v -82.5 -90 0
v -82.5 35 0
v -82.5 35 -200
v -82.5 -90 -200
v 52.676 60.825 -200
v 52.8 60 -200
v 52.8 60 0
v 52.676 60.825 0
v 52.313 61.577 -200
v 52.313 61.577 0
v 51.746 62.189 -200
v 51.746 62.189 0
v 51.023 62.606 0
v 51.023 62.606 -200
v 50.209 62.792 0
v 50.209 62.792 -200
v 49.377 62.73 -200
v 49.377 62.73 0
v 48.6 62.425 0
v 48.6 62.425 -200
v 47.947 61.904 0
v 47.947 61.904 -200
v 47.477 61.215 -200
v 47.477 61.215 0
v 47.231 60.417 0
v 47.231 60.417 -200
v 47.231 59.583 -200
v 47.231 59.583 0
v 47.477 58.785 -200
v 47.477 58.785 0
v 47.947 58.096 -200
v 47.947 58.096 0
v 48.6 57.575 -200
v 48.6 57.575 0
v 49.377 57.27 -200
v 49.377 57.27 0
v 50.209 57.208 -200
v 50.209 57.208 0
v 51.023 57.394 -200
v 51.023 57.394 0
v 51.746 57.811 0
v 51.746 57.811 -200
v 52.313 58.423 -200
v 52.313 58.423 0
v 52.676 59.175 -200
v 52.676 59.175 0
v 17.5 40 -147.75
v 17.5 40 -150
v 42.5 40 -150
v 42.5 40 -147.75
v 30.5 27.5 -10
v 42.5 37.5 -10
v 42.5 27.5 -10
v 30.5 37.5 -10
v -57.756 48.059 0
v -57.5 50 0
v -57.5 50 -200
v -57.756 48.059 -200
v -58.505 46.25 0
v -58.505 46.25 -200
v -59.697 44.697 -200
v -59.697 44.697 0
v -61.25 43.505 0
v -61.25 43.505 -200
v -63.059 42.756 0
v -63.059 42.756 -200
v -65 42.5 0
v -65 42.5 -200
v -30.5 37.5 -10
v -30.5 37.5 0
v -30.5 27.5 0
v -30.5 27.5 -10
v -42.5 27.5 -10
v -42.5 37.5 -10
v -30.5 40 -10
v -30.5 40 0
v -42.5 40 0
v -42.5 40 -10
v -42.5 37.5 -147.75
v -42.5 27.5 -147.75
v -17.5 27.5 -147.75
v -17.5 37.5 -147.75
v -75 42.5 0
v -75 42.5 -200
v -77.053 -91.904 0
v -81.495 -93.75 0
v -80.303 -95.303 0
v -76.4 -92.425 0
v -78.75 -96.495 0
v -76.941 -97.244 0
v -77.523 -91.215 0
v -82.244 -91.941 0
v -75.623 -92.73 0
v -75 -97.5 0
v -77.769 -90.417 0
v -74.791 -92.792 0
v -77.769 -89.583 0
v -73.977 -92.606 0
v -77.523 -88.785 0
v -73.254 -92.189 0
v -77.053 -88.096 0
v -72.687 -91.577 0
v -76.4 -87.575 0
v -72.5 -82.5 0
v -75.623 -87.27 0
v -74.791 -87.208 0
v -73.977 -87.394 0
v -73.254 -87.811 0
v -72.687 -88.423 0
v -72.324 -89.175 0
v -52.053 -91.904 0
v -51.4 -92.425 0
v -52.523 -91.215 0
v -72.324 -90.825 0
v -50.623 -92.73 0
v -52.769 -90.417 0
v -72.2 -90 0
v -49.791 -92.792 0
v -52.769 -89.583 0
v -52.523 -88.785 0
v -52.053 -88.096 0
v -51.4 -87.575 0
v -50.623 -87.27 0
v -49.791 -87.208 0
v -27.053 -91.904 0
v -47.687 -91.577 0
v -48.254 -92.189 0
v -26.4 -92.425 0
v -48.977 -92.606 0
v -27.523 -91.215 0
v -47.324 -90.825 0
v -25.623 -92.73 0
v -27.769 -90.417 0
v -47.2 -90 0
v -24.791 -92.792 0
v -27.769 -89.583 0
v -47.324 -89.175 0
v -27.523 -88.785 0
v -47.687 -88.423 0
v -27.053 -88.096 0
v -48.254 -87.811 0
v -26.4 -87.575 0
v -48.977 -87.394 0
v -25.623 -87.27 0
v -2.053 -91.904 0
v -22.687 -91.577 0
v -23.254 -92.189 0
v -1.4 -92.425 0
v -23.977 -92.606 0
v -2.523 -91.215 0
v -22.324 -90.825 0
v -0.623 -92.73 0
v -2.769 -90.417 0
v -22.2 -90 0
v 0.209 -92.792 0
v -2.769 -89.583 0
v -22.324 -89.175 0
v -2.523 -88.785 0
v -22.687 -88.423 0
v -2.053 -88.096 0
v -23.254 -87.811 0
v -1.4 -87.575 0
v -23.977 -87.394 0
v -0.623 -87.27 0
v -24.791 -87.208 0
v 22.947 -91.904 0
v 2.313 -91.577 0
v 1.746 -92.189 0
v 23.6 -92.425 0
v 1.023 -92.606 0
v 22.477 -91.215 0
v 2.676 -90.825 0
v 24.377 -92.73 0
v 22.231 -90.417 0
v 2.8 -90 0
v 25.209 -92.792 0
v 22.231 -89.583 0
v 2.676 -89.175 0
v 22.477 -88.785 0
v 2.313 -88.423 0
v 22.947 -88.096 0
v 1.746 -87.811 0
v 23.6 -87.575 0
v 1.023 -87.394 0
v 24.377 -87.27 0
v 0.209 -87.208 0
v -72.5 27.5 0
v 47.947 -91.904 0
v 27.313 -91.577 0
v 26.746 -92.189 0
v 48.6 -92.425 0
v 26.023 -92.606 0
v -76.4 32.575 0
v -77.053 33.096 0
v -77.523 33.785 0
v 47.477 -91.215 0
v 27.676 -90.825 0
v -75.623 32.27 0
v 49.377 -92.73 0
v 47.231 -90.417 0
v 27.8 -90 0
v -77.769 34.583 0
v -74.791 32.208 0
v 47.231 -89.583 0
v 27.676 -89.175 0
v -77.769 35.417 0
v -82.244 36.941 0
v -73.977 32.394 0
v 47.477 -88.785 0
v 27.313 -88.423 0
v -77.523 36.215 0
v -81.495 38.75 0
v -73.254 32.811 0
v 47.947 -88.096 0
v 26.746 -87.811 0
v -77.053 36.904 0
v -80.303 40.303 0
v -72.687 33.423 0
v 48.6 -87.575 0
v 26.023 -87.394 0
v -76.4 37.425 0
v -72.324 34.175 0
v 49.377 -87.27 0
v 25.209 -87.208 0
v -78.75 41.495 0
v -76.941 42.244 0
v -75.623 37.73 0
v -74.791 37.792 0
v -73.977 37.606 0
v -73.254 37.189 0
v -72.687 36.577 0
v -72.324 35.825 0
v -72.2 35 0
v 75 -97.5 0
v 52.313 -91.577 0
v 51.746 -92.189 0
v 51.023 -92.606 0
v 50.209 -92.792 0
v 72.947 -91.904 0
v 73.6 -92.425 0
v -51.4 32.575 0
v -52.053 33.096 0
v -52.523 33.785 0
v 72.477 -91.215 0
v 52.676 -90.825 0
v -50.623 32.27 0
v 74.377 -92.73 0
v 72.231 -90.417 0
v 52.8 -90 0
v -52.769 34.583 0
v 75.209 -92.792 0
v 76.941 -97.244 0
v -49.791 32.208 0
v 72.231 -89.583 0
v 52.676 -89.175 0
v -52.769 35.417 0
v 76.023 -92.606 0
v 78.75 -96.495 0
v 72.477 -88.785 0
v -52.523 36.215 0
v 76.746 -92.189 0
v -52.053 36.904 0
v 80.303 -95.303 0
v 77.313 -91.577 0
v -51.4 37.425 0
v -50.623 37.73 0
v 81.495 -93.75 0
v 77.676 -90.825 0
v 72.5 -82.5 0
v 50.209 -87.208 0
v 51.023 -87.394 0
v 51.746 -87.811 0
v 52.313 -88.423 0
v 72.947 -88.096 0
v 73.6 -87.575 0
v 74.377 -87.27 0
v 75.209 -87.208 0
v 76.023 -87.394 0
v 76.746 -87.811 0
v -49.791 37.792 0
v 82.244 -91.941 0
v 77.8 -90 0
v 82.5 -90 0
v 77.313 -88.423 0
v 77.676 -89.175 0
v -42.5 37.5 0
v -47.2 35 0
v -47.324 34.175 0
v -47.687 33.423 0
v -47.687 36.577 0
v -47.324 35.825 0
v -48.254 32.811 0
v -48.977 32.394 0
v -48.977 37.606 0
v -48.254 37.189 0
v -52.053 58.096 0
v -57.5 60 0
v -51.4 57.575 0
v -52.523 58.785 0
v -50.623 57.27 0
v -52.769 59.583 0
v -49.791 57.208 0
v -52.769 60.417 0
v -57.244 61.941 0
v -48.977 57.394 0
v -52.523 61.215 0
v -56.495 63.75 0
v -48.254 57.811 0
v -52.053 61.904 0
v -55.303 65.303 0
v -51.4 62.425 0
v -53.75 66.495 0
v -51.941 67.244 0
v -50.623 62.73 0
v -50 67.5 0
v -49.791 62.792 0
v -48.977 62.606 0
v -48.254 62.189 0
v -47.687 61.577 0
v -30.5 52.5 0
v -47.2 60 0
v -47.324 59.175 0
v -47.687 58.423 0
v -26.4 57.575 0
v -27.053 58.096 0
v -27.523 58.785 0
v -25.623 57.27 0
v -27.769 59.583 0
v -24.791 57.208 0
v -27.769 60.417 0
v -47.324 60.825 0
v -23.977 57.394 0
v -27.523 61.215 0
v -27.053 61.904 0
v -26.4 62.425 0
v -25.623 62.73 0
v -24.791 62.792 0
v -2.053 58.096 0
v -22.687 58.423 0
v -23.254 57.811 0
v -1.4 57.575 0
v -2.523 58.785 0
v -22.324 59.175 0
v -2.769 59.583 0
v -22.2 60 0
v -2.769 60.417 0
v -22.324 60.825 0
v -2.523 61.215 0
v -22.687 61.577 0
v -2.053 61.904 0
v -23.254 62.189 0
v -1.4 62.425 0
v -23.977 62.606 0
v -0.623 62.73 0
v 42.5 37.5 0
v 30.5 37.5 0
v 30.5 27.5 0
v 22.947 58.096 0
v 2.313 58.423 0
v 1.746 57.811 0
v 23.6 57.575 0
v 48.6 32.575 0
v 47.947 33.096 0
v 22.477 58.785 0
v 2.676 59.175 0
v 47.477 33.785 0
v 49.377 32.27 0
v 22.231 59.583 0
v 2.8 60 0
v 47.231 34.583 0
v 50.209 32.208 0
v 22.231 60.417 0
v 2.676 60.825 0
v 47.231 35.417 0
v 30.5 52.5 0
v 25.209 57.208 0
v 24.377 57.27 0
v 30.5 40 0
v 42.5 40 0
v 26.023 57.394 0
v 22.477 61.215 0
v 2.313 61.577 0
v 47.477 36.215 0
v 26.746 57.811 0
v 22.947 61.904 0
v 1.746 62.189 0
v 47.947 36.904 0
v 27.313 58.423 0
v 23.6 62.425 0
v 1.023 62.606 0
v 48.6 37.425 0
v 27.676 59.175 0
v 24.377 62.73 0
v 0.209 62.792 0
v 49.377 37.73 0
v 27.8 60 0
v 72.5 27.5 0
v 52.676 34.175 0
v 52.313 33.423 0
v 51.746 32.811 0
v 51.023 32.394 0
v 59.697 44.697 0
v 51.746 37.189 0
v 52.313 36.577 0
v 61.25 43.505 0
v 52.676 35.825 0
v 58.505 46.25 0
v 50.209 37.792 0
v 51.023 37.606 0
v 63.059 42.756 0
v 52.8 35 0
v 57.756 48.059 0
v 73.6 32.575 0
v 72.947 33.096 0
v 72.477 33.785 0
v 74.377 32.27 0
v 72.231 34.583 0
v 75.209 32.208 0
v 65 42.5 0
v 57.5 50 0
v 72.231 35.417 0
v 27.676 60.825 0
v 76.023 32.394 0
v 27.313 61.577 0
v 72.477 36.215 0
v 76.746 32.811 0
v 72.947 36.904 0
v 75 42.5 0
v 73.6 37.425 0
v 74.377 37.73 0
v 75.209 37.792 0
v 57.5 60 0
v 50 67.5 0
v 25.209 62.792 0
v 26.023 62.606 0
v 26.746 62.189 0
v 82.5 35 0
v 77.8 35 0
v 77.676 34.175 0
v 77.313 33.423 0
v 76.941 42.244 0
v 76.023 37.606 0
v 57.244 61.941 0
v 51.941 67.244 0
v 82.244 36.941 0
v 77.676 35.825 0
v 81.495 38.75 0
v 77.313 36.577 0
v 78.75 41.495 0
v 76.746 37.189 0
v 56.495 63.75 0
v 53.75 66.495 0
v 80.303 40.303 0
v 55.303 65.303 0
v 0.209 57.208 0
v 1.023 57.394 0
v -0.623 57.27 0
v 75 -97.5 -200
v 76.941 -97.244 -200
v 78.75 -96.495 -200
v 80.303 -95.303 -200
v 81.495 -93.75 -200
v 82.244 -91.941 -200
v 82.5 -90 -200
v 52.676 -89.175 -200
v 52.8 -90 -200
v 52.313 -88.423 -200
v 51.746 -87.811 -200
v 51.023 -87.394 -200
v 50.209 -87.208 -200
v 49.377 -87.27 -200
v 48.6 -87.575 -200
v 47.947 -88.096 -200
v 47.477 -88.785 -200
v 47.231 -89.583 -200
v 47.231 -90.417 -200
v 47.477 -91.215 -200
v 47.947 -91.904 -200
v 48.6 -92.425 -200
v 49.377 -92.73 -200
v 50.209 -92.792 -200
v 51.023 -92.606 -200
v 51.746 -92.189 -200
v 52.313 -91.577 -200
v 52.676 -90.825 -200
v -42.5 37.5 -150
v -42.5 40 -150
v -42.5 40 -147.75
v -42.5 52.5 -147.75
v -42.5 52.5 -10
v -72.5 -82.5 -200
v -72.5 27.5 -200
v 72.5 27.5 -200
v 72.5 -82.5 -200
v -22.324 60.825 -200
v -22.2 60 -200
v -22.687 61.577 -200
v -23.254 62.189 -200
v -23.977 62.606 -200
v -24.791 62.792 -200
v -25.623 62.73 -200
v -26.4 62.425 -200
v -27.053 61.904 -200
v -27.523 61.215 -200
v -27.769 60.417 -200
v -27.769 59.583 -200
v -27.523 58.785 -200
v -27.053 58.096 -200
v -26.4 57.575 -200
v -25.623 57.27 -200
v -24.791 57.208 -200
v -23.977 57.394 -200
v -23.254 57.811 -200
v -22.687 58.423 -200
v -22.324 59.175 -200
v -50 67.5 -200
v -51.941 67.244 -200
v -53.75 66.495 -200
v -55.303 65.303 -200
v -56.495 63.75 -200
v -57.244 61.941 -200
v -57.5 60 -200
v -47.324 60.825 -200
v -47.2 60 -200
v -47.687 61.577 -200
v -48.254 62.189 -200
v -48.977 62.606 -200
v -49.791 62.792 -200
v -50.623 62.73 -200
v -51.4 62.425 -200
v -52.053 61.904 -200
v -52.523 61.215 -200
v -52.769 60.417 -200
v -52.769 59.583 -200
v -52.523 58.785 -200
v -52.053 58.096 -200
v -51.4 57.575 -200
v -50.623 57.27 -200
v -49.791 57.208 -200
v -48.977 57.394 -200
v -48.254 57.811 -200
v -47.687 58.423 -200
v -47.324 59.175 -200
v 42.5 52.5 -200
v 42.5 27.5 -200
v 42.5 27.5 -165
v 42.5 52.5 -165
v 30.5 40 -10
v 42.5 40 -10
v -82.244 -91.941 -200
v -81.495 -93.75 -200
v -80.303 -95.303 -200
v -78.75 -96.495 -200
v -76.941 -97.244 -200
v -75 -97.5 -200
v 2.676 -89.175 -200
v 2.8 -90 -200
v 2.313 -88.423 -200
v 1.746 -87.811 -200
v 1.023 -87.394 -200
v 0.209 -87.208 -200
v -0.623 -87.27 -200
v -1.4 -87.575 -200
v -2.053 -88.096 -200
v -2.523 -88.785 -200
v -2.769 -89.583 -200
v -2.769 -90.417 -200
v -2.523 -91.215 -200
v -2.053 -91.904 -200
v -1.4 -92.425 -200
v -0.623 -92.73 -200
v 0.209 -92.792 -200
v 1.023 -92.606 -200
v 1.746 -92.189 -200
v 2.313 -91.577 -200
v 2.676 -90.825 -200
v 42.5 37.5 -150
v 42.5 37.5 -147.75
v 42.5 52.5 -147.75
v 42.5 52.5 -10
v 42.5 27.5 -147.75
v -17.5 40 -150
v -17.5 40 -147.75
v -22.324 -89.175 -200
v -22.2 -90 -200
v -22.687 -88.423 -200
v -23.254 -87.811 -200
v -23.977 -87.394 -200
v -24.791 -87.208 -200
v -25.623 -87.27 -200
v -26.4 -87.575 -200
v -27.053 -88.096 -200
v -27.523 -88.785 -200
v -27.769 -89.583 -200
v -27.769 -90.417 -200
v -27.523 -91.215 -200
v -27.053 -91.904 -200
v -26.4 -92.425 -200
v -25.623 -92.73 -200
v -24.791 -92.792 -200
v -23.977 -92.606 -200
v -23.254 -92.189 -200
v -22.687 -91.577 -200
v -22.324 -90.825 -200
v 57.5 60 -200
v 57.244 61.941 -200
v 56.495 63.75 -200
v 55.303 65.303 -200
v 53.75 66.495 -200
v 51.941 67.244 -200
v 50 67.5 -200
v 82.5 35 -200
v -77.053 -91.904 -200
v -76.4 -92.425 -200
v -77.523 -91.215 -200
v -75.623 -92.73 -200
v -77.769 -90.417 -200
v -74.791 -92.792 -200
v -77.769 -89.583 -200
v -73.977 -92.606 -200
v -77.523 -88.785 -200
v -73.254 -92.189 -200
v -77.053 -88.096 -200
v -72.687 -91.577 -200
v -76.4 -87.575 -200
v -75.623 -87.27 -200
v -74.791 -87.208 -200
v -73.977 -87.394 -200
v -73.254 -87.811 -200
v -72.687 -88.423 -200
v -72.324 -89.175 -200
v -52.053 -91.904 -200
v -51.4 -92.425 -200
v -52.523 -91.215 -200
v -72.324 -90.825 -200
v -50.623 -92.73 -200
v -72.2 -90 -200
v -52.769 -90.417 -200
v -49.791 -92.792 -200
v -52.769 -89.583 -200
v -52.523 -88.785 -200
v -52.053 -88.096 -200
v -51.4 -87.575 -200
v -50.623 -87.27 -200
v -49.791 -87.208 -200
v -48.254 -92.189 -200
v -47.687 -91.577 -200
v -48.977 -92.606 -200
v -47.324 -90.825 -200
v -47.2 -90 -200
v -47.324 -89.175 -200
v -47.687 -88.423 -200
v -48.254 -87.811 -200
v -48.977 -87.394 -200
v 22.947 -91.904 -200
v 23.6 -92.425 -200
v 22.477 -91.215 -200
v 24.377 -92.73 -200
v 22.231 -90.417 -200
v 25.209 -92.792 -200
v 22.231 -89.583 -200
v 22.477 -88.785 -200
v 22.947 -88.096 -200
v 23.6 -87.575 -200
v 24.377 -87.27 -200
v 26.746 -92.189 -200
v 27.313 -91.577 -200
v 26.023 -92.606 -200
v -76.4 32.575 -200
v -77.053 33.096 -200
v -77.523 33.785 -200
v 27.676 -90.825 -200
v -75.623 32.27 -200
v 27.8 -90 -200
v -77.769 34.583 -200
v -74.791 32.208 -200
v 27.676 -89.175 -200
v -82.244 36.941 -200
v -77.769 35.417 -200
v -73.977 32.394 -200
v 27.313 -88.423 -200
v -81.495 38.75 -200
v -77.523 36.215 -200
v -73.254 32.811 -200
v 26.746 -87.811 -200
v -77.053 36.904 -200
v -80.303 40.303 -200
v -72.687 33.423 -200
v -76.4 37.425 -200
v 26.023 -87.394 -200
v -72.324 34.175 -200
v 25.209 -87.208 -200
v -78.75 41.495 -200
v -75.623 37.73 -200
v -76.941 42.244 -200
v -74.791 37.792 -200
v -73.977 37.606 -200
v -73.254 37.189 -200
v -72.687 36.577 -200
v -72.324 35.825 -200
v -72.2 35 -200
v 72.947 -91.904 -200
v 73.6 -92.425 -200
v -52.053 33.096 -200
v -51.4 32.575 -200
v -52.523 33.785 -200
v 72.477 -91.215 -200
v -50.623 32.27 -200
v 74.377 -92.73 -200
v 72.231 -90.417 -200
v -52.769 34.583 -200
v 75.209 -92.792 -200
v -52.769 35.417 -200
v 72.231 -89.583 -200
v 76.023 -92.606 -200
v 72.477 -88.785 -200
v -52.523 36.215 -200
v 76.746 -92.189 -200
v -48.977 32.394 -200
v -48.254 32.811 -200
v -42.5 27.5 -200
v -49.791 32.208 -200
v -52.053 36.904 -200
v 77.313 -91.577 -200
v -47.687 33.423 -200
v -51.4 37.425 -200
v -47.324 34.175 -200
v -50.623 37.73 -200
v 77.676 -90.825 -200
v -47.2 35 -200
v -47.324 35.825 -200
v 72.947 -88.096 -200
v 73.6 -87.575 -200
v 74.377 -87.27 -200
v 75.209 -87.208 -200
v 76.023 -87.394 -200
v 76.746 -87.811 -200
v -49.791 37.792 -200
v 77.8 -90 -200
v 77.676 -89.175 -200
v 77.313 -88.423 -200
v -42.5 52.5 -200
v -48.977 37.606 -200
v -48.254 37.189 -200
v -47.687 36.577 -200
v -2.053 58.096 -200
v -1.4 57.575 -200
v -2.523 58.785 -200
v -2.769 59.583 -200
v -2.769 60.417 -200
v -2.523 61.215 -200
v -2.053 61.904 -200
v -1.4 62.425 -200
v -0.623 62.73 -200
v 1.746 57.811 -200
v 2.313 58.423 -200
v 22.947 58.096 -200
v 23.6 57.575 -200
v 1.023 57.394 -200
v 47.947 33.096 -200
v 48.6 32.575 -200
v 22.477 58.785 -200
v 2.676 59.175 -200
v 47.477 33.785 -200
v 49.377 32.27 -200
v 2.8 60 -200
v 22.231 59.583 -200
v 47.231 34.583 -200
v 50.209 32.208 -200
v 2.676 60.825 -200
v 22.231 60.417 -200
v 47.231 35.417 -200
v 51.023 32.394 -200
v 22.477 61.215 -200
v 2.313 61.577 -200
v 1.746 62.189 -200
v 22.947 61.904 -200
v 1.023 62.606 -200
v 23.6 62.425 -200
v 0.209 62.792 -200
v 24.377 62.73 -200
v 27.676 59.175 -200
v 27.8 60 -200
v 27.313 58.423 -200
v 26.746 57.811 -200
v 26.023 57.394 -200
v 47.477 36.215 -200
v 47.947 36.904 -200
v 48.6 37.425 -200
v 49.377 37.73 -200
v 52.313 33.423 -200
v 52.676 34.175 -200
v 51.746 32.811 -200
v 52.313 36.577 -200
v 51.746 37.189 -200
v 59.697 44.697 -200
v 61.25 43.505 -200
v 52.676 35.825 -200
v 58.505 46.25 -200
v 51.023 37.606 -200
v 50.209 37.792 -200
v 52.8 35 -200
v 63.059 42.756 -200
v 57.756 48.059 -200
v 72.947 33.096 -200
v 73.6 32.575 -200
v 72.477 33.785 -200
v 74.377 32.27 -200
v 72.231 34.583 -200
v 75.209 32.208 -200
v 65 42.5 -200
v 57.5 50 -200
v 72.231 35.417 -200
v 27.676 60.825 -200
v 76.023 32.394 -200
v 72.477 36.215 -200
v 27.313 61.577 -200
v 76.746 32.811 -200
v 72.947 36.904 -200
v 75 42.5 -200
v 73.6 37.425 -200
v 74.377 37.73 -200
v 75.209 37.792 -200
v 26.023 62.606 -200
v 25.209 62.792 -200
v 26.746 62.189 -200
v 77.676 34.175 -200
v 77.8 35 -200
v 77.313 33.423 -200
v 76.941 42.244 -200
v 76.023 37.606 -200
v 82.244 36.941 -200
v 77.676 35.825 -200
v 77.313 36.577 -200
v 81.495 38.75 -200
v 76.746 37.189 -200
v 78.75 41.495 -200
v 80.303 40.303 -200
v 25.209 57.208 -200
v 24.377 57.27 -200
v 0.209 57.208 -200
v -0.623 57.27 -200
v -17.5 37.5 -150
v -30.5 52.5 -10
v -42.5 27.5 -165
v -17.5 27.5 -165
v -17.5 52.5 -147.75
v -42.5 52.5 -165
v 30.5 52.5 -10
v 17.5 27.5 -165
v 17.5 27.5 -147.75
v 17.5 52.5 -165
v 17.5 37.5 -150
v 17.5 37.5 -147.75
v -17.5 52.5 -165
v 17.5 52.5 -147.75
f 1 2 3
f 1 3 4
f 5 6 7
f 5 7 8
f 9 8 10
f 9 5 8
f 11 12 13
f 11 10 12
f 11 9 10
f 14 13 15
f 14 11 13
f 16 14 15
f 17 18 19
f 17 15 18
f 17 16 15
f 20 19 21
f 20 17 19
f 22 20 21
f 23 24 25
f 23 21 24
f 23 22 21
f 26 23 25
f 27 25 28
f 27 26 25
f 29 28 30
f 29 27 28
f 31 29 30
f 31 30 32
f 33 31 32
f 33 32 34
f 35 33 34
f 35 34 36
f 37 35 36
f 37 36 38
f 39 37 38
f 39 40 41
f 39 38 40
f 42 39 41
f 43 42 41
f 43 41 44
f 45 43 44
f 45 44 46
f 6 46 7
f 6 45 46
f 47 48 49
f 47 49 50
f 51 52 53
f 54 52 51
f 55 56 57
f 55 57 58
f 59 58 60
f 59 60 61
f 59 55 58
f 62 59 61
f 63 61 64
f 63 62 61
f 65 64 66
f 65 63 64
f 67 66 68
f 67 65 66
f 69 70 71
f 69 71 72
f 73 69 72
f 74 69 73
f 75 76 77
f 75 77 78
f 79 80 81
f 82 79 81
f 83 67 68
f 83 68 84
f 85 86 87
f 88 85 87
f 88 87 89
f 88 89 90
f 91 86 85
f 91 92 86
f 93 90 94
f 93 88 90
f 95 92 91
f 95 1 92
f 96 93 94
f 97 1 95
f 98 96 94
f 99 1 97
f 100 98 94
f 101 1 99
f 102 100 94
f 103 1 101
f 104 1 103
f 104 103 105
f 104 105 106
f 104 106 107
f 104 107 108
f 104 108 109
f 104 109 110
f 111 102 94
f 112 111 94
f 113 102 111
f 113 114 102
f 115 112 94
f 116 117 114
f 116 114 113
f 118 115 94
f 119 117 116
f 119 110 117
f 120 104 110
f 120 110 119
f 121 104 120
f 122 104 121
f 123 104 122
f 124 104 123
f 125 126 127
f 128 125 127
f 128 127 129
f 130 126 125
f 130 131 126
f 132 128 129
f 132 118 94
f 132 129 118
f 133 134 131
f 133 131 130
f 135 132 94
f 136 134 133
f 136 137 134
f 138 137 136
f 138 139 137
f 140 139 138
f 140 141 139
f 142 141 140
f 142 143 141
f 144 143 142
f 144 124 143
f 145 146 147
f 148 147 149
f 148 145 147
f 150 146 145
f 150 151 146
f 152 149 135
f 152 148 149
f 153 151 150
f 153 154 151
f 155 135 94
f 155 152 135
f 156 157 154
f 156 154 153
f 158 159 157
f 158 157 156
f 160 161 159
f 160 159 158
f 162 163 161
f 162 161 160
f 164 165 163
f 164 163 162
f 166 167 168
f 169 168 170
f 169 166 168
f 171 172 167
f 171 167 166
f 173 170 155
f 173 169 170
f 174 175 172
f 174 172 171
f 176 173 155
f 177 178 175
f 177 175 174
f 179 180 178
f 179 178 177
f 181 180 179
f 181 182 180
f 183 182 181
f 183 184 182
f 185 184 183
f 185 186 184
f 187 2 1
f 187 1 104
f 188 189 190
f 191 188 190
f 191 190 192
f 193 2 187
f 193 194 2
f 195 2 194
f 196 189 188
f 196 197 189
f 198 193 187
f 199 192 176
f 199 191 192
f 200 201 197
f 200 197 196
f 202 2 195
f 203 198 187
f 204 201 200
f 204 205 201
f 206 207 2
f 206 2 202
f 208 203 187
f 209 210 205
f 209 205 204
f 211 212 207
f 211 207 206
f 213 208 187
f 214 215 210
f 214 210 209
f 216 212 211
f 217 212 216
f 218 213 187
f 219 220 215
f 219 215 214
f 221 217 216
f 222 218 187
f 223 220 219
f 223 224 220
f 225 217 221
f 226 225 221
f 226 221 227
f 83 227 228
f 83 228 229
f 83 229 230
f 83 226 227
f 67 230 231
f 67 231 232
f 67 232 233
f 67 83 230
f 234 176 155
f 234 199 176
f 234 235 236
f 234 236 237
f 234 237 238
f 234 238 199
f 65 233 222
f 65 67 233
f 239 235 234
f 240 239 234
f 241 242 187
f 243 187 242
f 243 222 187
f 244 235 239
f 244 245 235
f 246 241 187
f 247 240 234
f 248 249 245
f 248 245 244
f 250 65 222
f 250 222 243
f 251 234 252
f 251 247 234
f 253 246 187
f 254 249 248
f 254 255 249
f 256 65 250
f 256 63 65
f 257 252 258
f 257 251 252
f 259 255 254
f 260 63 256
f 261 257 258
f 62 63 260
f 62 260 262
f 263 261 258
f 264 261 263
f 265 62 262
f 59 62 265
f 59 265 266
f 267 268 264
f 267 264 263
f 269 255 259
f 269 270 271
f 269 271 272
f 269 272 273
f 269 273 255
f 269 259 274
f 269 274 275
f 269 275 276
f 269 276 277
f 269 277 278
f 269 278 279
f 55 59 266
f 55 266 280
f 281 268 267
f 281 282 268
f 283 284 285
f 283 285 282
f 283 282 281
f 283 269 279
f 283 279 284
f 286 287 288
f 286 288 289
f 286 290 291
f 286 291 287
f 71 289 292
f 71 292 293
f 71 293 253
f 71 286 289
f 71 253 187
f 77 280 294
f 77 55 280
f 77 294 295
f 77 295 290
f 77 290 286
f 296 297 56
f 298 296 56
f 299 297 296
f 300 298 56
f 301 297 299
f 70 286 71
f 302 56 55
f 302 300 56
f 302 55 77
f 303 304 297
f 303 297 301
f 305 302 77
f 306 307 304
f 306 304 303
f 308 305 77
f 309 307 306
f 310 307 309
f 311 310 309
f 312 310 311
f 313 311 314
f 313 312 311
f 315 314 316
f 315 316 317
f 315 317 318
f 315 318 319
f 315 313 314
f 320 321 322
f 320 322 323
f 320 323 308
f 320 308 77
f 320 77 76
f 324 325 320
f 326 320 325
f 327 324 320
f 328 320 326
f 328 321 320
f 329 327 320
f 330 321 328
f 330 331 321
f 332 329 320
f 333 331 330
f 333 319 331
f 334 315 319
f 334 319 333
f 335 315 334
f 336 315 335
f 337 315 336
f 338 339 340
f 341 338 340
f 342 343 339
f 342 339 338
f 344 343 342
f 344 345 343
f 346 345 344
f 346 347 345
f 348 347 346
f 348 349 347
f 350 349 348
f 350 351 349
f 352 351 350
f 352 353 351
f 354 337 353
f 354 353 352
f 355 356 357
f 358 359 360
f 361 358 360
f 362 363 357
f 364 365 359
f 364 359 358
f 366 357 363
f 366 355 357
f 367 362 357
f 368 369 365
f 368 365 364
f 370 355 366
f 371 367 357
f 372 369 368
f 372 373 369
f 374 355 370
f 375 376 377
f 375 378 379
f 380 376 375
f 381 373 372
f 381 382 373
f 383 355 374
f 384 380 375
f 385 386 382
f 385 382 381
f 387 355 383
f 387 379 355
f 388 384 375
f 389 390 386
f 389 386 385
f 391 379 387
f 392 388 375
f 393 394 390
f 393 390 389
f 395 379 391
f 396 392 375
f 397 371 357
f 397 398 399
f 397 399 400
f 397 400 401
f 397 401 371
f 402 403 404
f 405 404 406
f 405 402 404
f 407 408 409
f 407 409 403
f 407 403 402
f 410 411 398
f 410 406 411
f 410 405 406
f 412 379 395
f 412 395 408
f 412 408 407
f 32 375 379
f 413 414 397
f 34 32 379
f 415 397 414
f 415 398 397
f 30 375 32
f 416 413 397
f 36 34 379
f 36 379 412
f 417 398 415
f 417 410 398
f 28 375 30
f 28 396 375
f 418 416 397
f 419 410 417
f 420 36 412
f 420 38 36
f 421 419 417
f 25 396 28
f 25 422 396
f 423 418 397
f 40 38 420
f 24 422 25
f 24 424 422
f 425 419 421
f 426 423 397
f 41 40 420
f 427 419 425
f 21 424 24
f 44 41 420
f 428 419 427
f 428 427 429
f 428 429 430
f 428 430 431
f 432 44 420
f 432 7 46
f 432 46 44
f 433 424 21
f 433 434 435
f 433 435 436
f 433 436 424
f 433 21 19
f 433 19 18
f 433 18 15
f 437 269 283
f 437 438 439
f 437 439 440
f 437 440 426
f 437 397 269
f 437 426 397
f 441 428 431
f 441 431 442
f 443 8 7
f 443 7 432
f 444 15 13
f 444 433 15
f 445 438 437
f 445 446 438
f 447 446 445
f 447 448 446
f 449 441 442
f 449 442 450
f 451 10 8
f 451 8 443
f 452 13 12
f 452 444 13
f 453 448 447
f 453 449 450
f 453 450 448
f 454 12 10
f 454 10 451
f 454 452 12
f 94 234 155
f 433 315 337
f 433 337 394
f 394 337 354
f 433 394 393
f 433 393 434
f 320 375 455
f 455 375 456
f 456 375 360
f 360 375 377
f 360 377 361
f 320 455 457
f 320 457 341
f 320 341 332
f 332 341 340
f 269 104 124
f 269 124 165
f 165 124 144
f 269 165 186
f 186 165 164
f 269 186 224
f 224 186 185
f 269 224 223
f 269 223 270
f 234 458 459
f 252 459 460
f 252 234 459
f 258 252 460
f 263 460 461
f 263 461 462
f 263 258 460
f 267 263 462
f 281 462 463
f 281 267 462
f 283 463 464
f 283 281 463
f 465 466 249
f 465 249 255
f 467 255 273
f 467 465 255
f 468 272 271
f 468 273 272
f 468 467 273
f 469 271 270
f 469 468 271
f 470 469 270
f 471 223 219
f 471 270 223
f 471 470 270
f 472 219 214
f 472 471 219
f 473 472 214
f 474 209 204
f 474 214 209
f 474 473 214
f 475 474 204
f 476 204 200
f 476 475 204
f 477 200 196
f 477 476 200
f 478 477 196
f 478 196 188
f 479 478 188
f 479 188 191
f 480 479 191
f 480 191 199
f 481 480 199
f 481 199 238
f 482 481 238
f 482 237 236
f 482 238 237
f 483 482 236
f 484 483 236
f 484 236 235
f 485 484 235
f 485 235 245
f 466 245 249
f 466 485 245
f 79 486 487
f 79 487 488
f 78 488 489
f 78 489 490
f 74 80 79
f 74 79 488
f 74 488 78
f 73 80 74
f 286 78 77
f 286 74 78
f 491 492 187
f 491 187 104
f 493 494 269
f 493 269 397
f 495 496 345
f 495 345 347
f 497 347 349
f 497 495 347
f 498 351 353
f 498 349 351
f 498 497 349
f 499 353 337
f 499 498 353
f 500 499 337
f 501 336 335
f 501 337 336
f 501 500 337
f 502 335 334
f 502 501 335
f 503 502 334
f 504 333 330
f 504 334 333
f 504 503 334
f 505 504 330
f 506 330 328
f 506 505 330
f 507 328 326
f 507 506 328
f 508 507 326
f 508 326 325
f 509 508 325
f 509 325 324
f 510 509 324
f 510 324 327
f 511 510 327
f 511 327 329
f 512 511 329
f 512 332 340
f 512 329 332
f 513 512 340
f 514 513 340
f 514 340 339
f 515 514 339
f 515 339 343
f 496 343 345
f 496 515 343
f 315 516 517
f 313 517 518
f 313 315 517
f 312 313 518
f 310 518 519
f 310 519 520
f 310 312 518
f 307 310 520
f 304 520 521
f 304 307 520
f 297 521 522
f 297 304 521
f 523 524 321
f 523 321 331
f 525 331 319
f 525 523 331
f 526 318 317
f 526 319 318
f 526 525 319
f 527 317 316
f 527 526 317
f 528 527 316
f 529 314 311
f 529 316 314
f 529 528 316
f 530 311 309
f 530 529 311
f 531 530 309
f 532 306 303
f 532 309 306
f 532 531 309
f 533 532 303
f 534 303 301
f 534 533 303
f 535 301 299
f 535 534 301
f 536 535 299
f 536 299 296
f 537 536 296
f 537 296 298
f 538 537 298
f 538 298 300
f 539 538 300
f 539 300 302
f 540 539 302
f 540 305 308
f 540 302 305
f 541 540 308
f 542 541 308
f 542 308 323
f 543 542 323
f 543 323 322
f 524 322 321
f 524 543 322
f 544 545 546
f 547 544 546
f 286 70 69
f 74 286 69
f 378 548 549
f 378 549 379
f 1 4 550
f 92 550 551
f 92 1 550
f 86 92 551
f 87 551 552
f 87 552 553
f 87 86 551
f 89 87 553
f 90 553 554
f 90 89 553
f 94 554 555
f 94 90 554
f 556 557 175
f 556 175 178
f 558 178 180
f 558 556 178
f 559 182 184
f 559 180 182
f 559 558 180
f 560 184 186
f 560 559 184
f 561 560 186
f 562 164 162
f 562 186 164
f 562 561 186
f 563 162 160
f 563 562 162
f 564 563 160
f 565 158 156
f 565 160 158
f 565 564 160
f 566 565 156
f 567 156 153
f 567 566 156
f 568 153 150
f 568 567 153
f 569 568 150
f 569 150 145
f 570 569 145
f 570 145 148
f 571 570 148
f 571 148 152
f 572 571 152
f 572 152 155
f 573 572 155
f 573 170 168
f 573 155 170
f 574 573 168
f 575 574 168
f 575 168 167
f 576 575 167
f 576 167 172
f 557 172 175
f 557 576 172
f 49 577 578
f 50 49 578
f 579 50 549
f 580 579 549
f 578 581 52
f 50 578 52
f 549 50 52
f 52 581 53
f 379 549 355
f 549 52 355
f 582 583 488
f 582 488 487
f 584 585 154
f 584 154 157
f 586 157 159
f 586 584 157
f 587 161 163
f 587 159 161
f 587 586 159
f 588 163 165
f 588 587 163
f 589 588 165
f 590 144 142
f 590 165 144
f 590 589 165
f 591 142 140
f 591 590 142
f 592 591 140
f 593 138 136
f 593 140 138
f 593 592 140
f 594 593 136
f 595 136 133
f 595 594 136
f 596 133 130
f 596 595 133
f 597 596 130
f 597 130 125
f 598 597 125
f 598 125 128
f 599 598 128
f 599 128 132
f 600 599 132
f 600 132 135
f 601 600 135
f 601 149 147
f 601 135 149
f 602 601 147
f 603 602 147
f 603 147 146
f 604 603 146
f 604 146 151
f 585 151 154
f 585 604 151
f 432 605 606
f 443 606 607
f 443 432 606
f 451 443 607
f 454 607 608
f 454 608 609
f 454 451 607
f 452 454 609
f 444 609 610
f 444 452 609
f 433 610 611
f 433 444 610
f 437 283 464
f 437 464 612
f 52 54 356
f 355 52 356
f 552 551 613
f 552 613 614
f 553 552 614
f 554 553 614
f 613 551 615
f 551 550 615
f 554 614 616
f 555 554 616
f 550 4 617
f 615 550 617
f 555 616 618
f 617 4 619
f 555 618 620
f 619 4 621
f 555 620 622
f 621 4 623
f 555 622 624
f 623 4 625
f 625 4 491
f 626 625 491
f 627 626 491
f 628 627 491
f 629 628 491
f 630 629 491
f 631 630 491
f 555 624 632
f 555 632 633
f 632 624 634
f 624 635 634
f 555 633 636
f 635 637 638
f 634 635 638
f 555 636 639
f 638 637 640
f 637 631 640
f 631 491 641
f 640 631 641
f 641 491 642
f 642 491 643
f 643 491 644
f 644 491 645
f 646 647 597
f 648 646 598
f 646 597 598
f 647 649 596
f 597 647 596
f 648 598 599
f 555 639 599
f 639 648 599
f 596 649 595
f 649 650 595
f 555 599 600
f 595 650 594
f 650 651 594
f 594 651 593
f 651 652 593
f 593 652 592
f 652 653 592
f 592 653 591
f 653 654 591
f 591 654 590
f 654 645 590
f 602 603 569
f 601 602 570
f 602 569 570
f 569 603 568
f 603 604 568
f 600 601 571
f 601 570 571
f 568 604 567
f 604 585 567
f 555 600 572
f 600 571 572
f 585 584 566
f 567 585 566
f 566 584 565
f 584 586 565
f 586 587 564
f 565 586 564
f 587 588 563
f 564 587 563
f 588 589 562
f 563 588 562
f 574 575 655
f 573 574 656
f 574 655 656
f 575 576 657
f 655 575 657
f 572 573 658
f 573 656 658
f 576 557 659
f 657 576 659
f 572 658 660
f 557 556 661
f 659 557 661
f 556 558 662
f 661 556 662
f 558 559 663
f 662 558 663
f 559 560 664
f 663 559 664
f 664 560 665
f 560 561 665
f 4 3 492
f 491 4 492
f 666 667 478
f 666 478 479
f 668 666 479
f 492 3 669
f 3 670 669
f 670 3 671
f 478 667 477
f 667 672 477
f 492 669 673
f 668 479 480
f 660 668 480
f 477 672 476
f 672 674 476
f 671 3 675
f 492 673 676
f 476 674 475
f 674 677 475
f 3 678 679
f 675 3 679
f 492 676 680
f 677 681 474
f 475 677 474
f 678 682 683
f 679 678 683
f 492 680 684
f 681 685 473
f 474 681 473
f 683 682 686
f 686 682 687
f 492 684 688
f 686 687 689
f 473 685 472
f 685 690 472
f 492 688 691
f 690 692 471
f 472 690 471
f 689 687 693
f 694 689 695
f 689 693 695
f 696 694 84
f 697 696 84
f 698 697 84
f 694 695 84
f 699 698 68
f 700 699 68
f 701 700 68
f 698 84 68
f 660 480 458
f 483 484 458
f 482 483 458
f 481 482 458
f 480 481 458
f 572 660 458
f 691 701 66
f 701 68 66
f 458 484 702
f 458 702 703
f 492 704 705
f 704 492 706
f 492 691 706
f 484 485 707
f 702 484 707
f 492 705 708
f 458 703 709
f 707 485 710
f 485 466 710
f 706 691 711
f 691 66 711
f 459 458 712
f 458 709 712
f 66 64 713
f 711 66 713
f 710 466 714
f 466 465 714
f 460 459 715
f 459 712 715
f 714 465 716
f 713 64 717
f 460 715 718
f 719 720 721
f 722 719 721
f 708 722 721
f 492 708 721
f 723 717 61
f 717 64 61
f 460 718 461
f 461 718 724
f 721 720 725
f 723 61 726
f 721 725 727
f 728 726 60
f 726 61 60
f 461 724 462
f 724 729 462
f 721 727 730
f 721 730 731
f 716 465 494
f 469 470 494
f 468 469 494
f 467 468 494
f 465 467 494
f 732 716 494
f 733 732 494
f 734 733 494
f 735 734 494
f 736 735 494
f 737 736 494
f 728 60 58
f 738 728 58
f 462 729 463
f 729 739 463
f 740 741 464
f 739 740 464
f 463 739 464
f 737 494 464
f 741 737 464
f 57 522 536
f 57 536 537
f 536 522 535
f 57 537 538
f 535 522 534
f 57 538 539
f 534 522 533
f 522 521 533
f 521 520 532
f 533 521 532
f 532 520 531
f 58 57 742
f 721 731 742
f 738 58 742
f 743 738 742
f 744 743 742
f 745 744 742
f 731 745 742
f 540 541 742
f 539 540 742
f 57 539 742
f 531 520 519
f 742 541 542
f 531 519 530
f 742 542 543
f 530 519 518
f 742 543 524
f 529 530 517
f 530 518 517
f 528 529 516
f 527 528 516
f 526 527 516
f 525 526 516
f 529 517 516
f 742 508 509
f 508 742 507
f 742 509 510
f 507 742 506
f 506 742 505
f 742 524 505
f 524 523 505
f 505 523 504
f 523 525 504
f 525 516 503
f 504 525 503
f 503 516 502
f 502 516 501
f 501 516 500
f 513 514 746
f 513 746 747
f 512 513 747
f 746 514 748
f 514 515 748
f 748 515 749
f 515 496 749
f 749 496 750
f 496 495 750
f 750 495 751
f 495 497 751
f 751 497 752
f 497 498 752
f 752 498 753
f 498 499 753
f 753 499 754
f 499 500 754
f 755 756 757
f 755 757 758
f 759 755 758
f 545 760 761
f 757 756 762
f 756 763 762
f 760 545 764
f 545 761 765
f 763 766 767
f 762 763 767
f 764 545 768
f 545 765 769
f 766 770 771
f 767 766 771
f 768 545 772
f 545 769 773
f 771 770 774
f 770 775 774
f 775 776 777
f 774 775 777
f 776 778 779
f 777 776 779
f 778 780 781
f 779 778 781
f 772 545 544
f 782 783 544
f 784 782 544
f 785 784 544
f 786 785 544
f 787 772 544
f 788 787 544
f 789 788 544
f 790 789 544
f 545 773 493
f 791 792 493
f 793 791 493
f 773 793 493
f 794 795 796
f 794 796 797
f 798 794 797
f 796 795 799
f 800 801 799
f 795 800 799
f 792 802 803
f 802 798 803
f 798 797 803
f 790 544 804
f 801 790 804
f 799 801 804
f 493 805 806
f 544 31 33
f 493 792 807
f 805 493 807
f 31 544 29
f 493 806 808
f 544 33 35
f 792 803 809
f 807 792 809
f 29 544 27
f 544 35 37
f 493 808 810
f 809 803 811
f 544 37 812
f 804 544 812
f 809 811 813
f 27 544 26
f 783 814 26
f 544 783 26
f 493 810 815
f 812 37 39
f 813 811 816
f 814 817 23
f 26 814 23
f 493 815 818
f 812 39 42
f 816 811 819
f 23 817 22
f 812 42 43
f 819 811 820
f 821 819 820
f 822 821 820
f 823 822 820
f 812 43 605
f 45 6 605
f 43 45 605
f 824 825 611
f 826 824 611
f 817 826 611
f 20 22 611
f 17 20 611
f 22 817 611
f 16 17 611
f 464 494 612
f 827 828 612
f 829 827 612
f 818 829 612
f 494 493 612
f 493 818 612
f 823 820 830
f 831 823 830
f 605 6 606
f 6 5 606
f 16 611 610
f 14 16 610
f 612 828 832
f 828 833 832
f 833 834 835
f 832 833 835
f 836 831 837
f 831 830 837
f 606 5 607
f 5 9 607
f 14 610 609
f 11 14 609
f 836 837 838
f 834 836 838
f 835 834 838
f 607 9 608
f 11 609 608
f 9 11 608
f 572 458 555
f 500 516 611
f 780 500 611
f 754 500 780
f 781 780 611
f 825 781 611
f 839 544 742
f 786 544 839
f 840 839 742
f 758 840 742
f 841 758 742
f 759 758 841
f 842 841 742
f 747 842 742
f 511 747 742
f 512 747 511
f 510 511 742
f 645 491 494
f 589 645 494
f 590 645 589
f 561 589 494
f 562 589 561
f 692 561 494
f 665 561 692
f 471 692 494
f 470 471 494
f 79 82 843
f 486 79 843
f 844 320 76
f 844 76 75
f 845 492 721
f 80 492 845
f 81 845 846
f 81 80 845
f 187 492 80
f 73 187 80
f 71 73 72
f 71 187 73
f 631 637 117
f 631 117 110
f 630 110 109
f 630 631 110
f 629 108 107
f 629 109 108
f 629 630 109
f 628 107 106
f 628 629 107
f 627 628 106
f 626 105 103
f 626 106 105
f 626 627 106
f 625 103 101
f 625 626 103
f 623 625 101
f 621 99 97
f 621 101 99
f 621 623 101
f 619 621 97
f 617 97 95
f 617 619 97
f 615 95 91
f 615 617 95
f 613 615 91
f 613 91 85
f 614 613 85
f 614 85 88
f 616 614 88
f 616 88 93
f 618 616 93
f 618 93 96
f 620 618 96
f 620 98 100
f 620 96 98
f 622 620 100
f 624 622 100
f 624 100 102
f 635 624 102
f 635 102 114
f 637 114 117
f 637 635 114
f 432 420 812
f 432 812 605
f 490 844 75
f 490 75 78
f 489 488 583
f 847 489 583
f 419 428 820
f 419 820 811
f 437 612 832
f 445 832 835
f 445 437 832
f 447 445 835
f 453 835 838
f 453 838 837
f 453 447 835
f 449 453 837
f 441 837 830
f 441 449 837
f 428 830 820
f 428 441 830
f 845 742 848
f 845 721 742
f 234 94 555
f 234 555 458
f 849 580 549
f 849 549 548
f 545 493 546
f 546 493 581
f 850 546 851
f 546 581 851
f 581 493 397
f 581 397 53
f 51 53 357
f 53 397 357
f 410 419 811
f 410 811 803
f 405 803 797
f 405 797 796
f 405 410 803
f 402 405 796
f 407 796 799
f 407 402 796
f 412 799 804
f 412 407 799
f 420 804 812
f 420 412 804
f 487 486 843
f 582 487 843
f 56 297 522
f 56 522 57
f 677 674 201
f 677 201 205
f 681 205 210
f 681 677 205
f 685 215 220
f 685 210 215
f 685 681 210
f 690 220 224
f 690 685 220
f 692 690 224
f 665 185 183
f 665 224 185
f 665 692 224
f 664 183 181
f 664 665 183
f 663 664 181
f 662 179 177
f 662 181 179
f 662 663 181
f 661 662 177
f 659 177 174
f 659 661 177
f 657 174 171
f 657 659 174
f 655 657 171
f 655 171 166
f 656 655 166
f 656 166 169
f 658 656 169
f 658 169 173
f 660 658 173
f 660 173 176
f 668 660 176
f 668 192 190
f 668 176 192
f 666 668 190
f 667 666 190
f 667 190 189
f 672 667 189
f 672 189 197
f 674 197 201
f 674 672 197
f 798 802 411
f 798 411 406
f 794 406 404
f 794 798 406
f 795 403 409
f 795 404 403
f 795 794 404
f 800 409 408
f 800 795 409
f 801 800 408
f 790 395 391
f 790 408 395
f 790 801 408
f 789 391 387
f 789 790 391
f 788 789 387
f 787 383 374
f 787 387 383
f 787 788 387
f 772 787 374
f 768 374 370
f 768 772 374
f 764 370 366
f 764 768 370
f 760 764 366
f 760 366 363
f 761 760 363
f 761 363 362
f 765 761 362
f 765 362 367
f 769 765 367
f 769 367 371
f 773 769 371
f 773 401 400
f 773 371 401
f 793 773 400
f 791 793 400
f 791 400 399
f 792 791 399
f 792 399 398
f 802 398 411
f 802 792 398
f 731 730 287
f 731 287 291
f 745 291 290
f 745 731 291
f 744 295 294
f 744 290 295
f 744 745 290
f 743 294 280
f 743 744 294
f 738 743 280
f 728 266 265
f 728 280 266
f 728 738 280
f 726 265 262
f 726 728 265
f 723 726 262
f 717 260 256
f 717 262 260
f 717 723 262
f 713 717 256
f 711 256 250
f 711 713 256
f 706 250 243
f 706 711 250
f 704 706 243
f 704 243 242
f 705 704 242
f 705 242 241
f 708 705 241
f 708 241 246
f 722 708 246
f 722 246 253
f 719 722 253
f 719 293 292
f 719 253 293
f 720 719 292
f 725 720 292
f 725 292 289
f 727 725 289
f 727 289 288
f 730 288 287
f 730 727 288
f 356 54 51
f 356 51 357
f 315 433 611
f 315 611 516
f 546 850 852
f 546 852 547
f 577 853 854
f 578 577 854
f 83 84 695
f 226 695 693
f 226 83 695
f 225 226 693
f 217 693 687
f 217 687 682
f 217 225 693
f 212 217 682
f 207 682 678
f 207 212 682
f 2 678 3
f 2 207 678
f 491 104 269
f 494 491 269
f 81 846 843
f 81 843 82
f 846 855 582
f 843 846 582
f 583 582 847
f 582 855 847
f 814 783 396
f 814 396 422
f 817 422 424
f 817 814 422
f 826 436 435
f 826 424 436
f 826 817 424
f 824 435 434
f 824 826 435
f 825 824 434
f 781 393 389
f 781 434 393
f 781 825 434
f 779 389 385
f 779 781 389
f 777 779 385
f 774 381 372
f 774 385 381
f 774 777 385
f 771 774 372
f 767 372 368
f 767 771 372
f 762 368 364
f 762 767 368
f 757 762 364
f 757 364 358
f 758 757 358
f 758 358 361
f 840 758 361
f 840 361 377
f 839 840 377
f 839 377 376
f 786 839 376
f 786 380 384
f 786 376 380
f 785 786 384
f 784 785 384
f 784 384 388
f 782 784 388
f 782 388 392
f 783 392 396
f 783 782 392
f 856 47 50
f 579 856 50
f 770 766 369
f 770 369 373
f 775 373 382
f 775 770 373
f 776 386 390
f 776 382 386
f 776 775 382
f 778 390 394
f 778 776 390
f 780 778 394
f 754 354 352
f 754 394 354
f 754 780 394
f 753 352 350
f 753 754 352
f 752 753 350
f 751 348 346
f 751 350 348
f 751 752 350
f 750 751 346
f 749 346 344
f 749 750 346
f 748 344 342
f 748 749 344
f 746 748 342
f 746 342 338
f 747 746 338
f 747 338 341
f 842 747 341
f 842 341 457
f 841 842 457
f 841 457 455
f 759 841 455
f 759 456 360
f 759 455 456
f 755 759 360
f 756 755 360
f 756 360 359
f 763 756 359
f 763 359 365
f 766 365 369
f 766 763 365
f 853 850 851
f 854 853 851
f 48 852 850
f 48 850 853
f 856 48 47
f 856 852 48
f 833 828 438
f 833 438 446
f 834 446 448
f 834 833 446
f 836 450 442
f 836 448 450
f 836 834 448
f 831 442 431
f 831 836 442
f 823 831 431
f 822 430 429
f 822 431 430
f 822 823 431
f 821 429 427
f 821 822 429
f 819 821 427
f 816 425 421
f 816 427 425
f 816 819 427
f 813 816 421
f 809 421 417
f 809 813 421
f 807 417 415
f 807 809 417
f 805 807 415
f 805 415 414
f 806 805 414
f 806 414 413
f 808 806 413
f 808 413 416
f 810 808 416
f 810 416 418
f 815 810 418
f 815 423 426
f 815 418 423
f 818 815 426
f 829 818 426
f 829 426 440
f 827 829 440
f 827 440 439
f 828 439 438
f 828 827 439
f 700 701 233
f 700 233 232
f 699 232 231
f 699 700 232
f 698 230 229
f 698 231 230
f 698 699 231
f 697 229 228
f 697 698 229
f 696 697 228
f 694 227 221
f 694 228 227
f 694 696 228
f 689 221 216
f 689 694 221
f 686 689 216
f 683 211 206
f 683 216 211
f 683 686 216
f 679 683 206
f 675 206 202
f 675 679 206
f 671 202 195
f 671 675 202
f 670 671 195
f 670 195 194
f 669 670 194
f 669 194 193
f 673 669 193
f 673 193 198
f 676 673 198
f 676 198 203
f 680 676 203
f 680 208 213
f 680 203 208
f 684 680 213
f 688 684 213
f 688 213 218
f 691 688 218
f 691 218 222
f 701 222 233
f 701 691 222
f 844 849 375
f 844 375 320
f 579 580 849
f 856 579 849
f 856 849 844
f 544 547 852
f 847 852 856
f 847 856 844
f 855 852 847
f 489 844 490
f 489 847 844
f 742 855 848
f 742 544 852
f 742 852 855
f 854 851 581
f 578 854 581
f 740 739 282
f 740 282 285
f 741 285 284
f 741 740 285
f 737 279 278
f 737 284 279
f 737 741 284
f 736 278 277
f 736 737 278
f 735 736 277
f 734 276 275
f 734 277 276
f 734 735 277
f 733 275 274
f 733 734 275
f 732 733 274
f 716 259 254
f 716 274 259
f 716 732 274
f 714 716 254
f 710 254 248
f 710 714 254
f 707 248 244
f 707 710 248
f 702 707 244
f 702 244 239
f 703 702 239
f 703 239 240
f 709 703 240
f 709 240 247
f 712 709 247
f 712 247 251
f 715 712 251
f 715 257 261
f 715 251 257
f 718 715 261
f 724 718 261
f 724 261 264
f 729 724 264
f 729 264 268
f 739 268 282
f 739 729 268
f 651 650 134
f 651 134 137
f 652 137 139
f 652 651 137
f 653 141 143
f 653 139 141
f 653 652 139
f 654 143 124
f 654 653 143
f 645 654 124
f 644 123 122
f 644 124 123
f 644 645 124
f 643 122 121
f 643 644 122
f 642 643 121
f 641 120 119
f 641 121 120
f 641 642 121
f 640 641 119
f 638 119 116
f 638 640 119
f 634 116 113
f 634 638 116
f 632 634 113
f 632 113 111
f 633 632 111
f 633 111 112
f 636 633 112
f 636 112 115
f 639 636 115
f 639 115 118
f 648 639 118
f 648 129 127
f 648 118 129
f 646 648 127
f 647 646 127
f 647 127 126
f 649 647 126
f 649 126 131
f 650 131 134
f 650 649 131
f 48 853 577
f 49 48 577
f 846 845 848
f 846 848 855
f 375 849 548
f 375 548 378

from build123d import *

# Parameters (mm, degrees)
BOSS_EXTRUDE1_DEPTH     = 200
CUT_EXTRUDE1_DEPTH      = 238.302549502
CUT_EXTRUDE1_DEPTH_BACK = 238.302549502
SKETCH2_R               = 2.8
SKETCH3_W               = 25
SKETCH3_H               = 200
BOSS_EXTRUDE2_DEPTH     = 25
SKETCH4_W               = 200
SKETCH4_H               = 2.5
CUT_EXTRUDE2_DEPTH      = 25
SKETCH5_W               = 200
SKETCH5_H               = 2.5
CUT_EXTRUDE3_DEPTH      = 25
CUT_EXTRUDE5_REACH      = 265.261
CUT_EXTRUDE7_REACH      = 251.862
SKETCH10_W              = 85
SKETCH10_H              = 35
SKETCH11_W              = 25
SKETCH11_H              = 15
BOSS_EXTRUDE3_DEPTH     = 25
CUT_EXTRUDE8_REACH      = 251.862
SKETCH12_W              = 85
SKETCH12_H              = 7.75


with BuildPart() as part:
    # Sketch1 → Boss-Extrude1 (new body)
    with BuildSketch(Plane.XY):
        with BuildLine():
            Line((-57.5, 60), (-57.5, 50))
            ThreePointArc((-57.5, 50), (-59.696699141, 44.696699141), (-65, 42.5))
            Line((-65, 42.5), (-75, 42.5))
            ThreePointArc((-75, 42.5), (-80.303300859, 40.303300859), (-82.5, 35))
            Line((-82.5, 35), (-82.5, -90))
            ThreePointArc((-82.5, -90), (-80.303300859, -95.303300859), (-75, -97.5))
            Line((-75, -97.5), (75, -97.5))
            ThreePointArc((75, -97.5), (80.303300859, -95.303300859), (82.5, -90))
            Line((82.5, -90), (82.5, 35))
            ThreePointArc((82.5, 35), (80.303300859, 40.303300859), (75, 42.5))
            Line((75, 42.5), (65, 42.5))
            ThreePointArc((65, 42.5), (59.696699141, 44.696699141), (57.5, 50))
            Line((57.5, 50), (57.5, 60))
            ThreePointArc((57.5, 60), (55.303300859, 65.303300859), (50, 67.5))
            Line((50, 67.5), (-50, 67.5))
            ThreePointArc((-50, 67.5), (-55.303300859, 65.303300859), (-57.5, 60))
        make_face()
        Polygon((-42.5, 52.5), (-42.5, 27.5), (-72.5, 27.5), (-72.5, -82.5), (72.5, -82.5), (72.5, 27.5), (42.5, 27.5), (42.5, 52.5), align=None, mode=Mode.SUBTRACT)
    extrude(amount=-BOSS_EXTRUDE1_DEPTH)

    # Sketch2 → Cut-Extrude1 (cut, two sides: drawn at the far end of the back side and taken through both)
    with BuildSketch(Plane.XY.offset(-CUT_EXTRUDE1_DEPTH_BACK)):
        with Locations((-75, 35)):
            Circle(SKETCH2_R)
        with Locations((-50, 35)):
            Circle(SKETCH2_R)
        with Locations((-50, 60)):
            Circle(SKETCH2_R)
        with Locations((50, 60)):
            Circle(SKETCH2_R)
        with Locations((25, 60)):
            Circle(SKETCH2_R)
        with Locations((0, 60)):
            Circle(SKETCH2_R)
        with Locations((-25, 60)):
            Circle(SKETCH2_R)
        with Locations((50, 35)):
            Circle(SKETCH2_R)
        with Locations((75, 35)):
            Circle(SKETCH2_R)
        with Locations((-75, -90)):
            Circle(SKETCH2_R)
        with Locations((-50, -90)):
            Circle(SKETCH2_R)
        with Locations((-25, -90)):
            Circle(SKETCH2_R)
        with Locations((0, -90)):
            Circle(SKETCH2_R)
        with Locations((25, -90)):
            Circle(SKETCH2_R)
        with Locations((50, -90)):
            Circle(SKETCH2_R)
        with Locations((75, -90)):
            Circle(SKETCH2_R)
    extrude(amount=CUT_EXTRUDE1_DEPTH + CUT_EXTRUDE1_DEPTH_BACK, mode=Mode.SUBTRACT)

    # Sketch3 → Boss-Extrude2 (add)
    with BuildSketch(Plane.XZ.offset(-52.5)):
        with Locations((-30, -100)):
            Rectangle(SKETCH3_W, SKETCH3_H)
        with Locations((30, -100)):
            Rectangle(SKETCH3_W, SKETCH3_H)
    extrude(amount=BOSS_EXTRUDE2_DEPTH)

    # Sketch4 → Cut-Extrude2 (cut)
    with BuildSketch(Plane(origin=(-17.5, 0, 0), x_dir=(0, 0, -1), z_dir=(1, 0, 0))):
        with Locations((100, 38.75)):
            Rectangle(SKETCH4_W, SKETCH4_H)
    extrude(amount=-CUT_EXTRUDE2_DEPTH, mode=Mode.SUBTRACT)

    # Sketch5 → Cut-Extrude3 (cut)
    with BuildSketch(Plane.ZY.offset(-17.5)):
        with Locations((-100, 38.75)):
            Rectangle(SKETCH5_W, SKETCH5_H)
    extrude(amount=-CUT_EXTRUDE3_DEPTH, mode=Mode.SUBTRACT)

    # Cut-Extrude5: up to this face of the body (flat: up to its plane)
    cut_extrude5_end = Plane(part.part.faces().sort_by_distance((-45, 27.5, -100))[0])
    # Sketch6 → Cut-Extrude5 (cut, up to the picked face)
    with BuildSketch(Plane.XZ.offset(-52.5), mode=Mode.PRIVATE) as cut_extrude5_sk1:
        Polygon((-30.5, 0), (-30.5, -10), (-42.5, -10), (-42.5, -60.8), (-42.5, -140), (-30.5, -140), (42.5, -140), (42.5, -60.8), (42.5, -10), (30.5, -10), (30.5, 0), (42.5, 0), (42.5, 1), (-42.5, 1), (-42.5, 0), align=None)
    cut_extrude5_tool1 = split(extrude(cut_extrude5_sk1.sketch, amount=CUT_EXTRUDE5_REACH, mode=Mode.PRIVATE), bisect_by=cut_extrude5_end, keep=Keep.BOTH, mode=Mode.PRIVATE)
    add(cut_extrude5_tool1.solids().sort_by(Axis((0, 52.5, -70.818008), (0, -1, 0)))[0], mode=Mode.SUBTRACT)

    # Cut-Extrude7: up to this face of the body (flat: up to its plane)
    cut_extrude7_end = Plane(part.part.faces().sort_by_distance((0, 52.5, -86.395348837))[0])
    # Sketch10 → Cut-Extrude7 (cut, up to the picked face)
    with BuildSketch(Plane.XZ.offset(-27.5), mode=Mode.PRIVATE) as cut_extrude7_sk1:
        with Locations((0, -182.5)):
            Rectangle(SKETCH10_W, SKETCH10_H)
    cut_extrude7_tool1 = split(extrude(cut_extrude7_sk1.sketch, amount=-CUT_EXTRUDE7_REACH, mode=Mode.PRIVATE), bisect_by=cut_extrude7_end, keep=Keep.BOTH, mode=Mode.PRIVATE)
    add(cut_extrude7_tool1.solids().sort_by(Axis((0, 27.5, -182.5), (0, 1, 0)))[0], mode=Mode.SUBTRACT)

    # Sketch11 → Boss-Extrude3 (add)
    with BuildSketch(Plane.XZ.offset(-27.5)):
        with Locations((-30, -157.5)):
            Rectangle(SKETCH11_W, SKETCH11_H)
        with Locations((30, -157.5)):
            Rectangle(SKETCH11_W, SKETCH11_H)
    extrude(amount=-BOSS_EXTRUDE3_DEPTH)

    # Cut-Extrude8: up to this face of the body (flat: up to its plane)
    cut_extrude8_end = Plane(part.part.faces().sort_by_distance((0, 52.5, -97.238878143))[0])
    # Sketch12 → Cut-Extrude8 (cut, up to the picked face)
    with BuildSketch(Plane.XZ.offset(-27.5), mode=Mode.PRIVATE) as cut_extrude8_sk1:
        with Locations((0, -143.875)):
            Rectangle(SKETCH12_W, SKETCH12_H)
    cut_extrude8_tool1 = split(extrude(cut_extrude8_sk1.sketch, amount=-CUT_EXTRUDE8_REACH, mode=Mode.PRIVATE), bisect_by=cut_extrude8_end, keep=Keep.BOTH, mode=Mode.PRIVATE)
    add(cut_extrude8_tool1.solids().sort_by(Axis((0, 27.5, -143.875), (0, 1, 0)))[0], mode=Mode.SUBTRACT)


solid = part.part
